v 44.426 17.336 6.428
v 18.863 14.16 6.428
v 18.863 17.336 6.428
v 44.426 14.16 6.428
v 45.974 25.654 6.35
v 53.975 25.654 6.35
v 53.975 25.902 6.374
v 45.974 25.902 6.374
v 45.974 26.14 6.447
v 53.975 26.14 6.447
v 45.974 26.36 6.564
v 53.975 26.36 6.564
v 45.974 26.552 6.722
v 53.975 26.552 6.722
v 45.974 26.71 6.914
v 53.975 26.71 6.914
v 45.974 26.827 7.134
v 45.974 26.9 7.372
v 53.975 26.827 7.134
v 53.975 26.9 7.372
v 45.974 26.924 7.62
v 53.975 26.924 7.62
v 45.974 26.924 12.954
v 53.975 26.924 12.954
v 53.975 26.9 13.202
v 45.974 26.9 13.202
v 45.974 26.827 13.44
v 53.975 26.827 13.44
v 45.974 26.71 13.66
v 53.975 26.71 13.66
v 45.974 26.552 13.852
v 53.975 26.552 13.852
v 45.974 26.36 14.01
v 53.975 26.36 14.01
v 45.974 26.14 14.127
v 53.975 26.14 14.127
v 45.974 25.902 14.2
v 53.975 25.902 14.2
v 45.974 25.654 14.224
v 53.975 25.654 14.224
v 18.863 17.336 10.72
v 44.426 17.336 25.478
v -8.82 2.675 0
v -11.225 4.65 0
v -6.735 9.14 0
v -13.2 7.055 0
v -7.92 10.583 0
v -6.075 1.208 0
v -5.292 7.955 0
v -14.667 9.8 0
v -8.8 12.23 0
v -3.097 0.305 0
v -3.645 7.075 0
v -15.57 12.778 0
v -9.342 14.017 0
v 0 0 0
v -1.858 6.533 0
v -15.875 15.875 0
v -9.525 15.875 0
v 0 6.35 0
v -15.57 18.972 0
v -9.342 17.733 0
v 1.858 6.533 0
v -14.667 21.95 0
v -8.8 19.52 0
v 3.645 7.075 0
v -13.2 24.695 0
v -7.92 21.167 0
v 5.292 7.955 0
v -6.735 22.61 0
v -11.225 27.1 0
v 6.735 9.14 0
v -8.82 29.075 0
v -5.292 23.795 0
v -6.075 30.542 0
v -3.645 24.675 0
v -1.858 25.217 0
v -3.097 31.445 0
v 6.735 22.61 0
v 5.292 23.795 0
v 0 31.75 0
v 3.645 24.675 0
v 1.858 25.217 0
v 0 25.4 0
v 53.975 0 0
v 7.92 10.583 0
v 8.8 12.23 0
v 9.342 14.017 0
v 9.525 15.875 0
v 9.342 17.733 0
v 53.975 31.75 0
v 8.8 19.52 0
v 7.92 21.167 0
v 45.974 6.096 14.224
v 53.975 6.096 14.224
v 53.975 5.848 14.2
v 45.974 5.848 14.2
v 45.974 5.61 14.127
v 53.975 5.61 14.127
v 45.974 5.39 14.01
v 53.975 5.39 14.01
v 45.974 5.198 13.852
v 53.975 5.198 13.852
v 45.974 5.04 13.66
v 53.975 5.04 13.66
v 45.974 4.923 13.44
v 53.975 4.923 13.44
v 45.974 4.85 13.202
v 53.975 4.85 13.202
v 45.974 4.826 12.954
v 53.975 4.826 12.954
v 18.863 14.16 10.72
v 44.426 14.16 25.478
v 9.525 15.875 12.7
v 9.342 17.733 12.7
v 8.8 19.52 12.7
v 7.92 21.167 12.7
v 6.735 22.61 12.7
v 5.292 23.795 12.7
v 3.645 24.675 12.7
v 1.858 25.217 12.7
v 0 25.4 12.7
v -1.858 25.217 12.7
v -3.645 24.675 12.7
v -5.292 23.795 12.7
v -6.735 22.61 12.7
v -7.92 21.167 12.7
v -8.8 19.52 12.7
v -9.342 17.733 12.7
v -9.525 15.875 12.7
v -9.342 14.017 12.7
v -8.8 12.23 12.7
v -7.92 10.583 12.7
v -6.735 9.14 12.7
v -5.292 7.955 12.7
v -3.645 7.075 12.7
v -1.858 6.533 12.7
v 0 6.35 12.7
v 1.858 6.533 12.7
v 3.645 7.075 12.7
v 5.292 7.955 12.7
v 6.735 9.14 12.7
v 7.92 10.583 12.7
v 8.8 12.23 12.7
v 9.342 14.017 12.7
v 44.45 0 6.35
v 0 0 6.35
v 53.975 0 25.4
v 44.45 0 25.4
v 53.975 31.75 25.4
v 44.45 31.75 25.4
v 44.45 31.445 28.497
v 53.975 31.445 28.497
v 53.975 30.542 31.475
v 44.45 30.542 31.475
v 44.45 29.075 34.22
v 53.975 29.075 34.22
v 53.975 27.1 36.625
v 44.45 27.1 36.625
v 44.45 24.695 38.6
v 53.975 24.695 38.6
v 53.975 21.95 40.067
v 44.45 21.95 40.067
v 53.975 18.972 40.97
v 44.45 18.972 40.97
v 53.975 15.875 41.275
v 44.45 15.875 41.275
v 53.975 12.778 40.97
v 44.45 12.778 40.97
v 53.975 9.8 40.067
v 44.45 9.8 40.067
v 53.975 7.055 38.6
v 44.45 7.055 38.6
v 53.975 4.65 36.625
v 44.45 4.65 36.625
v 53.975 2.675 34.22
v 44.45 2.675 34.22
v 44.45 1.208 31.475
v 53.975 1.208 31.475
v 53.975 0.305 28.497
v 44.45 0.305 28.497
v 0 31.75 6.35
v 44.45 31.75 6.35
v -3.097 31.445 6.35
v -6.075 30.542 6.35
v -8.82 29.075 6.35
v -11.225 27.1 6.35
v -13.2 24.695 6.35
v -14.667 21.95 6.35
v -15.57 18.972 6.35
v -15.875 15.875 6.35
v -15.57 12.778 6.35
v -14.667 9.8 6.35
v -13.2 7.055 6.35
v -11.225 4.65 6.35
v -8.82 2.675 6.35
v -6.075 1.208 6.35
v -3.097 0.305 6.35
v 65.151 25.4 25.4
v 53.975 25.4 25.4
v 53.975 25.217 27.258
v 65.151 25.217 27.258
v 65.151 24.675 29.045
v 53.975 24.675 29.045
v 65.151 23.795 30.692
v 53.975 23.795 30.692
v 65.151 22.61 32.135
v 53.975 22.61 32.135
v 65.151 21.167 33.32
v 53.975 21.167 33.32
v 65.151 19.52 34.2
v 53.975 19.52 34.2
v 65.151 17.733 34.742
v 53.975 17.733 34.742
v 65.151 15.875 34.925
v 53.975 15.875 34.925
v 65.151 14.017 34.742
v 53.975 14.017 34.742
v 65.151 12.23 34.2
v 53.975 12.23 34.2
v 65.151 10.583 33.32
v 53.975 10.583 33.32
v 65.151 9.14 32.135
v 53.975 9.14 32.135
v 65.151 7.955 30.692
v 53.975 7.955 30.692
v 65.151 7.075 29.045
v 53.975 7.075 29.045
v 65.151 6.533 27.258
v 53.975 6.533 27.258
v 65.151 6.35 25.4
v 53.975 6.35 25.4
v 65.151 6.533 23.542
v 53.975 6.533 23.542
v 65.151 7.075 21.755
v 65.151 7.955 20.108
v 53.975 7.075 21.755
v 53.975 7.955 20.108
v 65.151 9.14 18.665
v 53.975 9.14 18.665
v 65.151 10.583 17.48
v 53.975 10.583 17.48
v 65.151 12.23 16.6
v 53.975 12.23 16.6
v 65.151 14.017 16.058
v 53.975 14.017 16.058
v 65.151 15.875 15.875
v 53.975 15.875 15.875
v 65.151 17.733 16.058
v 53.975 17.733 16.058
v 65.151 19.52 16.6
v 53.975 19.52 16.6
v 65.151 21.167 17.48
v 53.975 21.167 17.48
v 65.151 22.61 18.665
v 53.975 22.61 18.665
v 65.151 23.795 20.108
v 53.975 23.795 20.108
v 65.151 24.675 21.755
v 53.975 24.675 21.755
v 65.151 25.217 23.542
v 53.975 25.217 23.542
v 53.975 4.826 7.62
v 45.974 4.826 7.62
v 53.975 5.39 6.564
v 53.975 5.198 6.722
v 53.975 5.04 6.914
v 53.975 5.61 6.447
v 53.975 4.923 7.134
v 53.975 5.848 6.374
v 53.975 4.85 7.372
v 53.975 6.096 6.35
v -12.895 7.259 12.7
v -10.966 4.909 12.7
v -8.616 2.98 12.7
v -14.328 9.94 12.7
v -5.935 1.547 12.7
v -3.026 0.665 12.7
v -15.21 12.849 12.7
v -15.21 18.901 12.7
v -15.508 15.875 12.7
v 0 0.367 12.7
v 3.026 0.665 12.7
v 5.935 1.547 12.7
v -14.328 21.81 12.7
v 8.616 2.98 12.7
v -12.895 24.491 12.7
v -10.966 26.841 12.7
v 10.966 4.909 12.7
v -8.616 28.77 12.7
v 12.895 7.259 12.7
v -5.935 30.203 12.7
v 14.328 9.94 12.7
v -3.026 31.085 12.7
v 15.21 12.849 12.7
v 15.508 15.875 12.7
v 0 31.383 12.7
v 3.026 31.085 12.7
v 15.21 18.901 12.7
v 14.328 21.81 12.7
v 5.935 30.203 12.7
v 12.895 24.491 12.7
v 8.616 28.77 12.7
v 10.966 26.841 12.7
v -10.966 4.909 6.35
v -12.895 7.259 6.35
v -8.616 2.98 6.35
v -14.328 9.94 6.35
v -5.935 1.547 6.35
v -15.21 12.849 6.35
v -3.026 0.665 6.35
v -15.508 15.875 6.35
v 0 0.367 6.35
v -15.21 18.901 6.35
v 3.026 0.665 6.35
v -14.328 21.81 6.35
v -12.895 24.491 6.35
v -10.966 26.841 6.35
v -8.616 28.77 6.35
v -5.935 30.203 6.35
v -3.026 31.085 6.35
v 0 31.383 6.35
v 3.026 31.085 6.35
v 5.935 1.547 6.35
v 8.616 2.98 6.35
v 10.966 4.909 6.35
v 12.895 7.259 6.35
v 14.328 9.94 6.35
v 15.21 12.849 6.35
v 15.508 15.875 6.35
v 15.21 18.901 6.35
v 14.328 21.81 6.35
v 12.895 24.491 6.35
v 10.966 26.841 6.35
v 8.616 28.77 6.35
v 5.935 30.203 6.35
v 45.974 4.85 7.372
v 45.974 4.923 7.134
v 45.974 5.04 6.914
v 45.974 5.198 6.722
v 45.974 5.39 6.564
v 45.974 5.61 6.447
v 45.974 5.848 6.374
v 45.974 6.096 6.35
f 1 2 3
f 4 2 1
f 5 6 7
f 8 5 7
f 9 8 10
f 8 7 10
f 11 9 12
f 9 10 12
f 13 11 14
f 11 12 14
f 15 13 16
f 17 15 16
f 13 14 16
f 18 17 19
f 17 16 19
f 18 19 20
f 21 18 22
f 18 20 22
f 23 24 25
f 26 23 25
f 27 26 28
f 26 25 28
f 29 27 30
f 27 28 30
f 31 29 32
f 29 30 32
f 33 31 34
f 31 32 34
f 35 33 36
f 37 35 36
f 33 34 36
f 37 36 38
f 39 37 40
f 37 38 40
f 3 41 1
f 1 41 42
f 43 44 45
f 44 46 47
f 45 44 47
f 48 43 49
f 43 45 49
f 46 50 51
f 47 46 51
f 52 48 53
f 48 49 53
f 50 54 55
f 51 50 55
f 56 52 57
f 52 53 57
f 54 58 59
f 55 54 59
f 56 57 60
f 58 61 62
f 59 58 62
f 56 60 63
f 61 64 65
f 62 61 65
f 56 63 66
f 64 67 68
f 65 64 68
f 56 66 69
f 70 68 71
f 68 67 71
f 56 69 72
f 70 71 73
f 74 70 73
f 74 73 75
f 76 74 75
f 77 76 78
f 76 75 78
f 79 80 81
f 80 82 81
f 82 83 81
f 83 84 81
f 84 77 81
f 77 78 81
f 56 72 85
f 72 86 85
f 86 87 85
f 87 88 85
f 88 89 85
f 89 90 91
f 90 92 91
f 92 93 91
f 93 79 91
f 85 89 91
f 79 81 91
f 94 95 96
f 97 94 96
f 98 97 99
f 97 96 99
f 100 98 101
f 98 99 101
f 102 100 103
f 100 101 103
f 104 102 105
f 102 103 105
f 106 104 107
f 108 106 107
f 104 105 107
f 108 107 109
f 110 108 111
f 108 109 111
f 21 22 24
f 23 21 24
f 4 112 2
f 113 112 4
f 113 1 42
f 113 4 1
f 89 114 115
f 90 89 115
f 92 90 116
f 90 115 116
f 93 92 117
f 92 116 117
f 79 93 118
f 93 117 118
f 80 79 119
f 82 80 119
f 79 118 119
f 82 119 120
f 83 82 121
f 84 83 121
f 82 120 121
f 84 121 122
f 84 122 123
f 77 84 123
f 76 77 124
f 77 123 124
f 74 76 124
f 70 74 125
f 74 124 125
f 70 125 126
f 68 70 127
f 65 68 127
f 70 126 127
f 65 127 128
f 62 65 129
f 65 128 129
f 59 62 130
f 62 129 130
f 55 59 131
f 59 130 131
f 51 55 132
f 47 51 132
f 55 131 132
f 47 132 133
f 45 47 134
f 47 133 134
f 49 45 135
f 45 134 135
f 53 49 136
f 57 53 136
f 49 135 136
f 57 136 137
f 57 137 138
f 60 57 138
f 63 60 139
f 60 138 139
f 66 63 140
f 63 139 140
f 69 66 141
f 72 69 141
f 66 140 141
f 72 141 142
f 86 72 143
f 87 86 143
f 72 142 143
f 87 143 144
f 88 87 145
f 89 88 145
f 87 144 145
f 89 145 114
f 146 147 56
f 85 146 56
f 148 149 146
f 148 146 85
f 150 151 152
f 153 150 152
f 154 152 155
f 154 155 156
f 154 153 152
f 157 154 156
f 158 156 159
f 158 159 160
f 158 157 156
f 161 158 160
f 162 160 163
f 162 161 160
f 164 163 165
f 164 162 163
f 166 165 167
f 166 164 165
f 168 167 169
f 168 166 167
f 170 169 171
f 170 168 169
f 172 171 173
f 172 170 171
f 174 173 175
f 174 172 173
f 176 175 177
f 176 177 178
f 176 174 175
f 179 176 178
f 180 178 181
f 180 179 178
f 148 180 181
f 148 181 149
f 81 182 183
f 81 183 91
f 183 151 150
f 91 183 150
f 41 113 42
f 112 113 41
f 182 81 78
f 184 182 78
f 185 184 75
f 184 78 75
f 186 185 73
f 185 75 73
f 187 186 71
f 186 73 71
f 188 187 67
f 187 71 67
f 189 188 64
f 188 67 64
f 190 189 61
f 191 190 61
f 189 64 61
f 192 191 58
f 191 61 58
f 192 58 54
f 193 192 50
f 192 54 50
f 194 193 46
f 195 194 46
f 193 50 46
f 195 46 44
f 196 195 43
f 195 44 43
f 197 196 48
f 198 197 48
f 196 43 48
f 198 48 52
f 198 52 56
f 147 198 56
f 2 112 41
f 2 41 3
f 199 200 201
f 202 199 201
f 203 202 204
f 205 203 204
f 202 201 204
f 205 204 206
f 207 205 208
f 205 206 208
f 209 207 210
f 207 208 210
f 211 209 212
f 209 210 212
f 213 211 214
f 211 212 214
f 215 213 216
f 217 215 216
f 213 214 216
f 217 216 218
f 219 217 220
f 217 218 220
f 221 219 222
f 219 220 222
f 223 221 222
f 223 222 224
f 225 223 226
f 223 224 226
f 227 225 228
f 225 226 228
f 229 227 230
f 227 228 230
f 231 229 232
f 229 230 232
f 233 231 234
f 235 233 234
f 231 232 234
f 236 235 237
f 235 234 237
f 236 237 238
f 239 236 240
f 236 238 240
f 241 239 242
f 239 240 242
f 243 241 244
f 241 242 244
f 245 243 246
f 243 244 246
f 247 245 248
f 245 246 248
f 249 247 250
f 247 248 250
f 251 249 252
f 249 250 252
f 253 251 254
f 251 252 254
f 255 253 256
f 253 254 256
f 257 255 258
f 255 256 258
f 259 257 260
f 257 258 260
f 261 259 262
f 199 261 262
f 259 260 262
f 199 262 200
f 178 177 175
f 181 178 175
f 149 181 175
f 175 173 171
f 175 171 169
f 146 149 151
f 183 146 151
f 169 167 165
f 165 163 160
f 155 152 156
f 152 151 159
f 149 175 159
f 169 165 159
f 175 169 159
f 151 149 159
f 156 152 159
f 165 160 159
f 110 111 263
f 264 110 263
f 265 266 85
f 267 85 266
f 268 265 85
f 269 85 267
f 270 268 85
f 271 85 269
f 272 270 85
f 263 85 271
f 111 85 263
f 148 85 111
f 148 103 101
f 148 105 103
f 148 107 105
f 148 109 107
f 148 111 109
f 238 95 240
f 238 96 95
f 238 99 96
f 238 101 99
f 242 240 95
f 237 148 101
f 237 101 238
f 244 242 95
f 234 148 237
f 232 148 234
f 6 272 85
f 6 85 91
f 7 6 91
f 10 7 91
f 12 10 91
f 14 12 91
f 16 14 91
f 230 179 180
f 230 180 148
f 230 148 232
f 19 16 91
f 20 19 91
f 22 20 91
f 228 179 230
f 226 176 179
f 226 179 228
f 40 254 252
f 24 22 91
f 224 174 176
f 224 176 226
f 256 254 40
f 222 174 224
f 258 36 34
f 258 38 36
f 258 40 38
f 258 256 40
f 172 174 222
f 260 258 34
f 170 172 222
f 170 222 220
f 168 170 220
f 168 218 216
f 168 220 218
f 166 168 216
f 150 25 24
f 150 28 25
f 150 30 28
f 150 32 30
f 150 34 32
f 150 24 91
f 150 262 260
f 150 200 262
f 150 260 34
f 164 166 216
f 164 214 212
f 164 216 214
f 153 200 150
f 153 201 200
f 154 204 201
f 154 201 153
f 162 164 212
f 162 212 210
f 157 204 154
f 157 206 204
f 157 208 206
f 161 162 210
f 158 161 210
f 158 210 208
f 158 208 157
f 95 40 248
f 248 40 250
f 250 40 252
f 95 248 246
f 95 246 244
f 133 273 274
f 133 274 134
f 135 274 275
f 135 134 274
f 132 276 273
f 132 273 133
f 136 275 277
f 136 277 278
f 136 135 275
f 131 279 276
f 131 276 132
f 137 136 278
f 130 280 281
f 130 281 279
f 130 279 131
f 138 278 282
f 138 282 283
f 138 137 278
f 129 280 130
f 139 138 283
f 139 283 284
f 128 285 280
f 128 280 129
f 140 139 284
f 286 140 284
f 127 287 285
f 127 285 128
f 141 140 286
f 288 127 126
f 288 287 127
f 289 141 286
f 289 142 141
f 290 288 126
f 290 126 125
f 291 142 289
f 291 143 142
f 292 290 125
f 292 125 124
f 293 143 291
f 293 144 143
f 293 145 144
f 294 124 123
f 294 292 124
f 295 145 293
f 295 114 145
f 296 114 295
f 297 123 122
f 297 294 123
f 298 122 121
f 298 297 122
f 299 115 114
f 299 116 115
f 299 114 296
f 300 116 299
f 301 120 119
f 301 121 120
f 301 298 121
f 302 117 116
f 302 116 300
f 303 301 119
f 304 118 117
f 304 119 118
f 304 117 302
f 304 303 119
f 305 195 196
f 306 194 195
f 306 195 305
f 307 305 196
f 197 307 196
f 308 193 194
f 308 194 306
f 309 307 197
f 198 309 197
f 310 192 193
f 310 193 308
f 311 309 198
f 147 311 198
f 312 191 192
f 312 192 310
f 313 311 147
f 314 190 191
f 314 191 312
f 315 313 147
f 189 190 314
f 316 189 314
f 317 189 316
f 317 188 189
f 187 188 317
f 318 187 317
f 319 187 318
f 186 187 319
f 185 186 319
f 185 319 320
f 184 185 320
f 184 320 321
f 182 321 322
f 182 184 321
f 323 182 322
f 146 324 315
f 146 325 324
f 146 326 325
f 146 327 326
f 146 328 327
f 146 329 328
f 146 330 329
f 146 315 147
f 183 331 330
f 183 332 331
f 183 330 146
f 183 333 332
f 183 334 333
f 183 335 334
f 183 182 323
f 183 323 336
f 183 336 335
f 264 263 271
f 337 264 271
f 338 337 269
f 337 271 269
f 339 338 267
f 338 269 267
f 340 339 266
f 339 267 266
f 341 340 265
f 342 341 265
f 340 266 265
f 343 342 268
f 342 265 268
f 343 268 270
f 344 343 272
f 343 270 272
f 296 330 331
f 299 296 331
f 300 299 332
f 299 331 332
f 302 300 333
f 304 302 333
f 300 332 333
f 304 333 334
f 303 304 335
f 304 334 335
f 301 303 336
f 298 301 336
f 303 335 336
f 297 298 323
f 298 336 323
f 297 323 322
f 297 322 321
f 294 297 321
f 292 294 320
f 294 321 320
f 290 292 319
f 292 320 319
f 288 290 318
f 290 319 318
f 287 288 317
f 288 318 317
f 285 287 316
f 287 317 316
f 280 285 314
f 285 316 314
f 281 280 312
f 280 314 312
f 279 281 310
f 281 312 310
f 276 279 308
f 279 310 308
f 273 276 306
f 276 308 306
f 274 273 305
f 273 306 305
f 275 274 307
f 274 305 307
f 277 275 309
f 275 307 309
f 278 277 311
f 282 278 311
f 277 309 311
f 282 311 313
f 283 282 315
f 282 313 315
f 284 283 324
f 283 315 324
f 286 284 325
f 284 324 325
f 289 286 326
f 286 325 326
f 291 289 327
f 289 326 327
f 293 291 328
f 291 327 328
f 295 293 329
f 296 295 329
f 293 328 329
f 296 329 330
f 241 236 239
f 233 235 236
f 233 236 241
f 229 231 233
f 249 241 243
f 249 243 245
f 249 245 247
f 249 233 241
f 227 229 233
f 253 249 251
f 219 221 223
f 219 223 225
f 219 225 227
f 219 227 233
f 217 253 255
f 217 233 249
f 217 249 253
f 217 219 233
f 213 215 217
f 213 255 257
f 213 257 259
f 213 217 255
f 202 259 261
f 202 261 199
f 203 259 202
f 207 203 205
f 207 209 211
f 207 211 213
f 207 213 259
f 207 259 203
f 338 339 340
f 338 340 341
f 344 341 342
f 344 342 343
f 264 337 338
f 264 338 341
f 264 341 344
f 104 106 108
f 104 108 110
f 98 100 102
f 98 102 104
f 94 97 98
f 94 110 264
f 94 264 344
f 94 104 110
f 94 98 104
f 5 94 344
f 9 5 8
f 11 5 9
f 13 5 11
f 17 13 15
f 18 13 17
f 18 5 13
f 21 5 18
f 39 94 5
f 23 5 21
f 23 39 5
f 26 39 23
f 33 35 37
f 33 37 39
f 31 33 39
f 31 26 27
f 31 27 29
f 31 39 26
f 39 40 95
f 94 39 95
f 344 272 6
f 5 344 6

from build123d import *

# Parameters (mm, degrees)
F0_W      = 53.975
F0_H      = 31.75
F1_DEPTH  = 6.35
F2_R      = 15.5082112309
F3_DEPTH  = 6.35
F4_R      = 9.525
F5_DEPTH  = 12.7
F6_W      = 9.525
F6_H      = 19.05
F7_DEPTH  = 31.75
F9_DEPTH  = 9.525
F10_R     = 9.525
F11_DEPTH = 11.176
F13_DEPTH = 8.001
F16_DEPTH = 1.5875


# Not quite as in the source:
# - the program builds the solid bodies; features that only make, move or delete a surface that nothing else refers to are left out


with BuildPart() as f1:
    # F0 (on Top) → F1 (new body)
    with BuildSketch(Plane.XY):
        with BuildLine():
            ThreePointArc((0, 31.75), (-15.875, 15.875), (0, 0))
            Line((0, 0), (0, 31.75))
        make_face()
        with Locations((26.9875, 15.875)):
            Rectangle(F0_W, F0_H)
    extrude(amount=F1_DEPTH)

    # F2 (on face) → F3 (join)
    with BuildSketch(Plane.XY.offset(6.35)):
        with Locations((0, 15.875)):
            Circle(F2_R)
    extrude(amount=F3_DEPTH)

    # F4 (on face) → F5 (cut)
    with BuildSketch(Plane.XY.offset(12.7)):
        with Locations((0, 15.875)):
            Circle(F4_R)
    extrude(amount=-F5_DEPTH, mode=Mode.SUBTRACT)

    # F6 (on face) → F7 (join)
    with BuildSketch(Plane.XZ):
        with Locations((49.2125, 15.875)):
            Rectangle(F6_W, F6_H)
    extrude(amount=-F7_DEPTH)

    # F8 (on face) → F9 (join)
    with BuildSketch(Plane.YZ.offset(53.975)):
        with BuildLine():
            Line((0, 25.4), (31.75, 25.4))
            ThreePointArc((31.75, 25.4), (15.875, 41.275), (0, 25.4))
        make_face()
    extrude(amount=-F9_DEPTH)

    # F10 (on face) → F11 (join)
    with BuildSketch(Plane.YZ.offset(53.975)):
        with Locations((15.875, 25.4)):
            Circle(F10_R)
    extrude(amount=F11_DEPTH)

    # F12 (on face) → F13 (cut)
    with BuildSketch(Plane.YZ.offset(53.975)):
        with BuildLine():
            Line((25.654, 14.224), (6.096, 14.224))
            ThreePointArc((6.096, 14.224), (5.1979743879, 13.8520256121), (4.826, 12.954))
            Line((4.826, 12.954), (4.826, 7.62))
            ThreePointArc((4.826, 7.62), (5.1979743879, 6.7219743879), (6.096, 6.35))
            Line((6.096, 6.35), (25.654, 6.35))
            ThreePointArc((25.654, 6.35), (26.5520256121, 6.7219743879), (26.924, 7.62))
            Line((26.924, 7.62), (26.924, 12.954))
            ThreePointArc((26.924, 12.954), (26.5520256121, 13.8520256121), (25.654, 14.224))
        make_face()
    extrude(amount=-F13_DEPTH, mode=Mode.SUBTRACT)


with BuildPart() as f16:
    # F15 (on offset) → F16 (new body, symmetric)
    with BuildSketch(Plane.XZ.offset(-15.748)):
        Polygon((44.4256004055, 6.4279241487), (44.4256004055, 25.4779241487), (18.863295002, 10.719520243), (18.863295002, 6.4279241487), align=None)
    extrude(amount=F16_DEPTH, both=True)


solid = Compound([f1.part, f16.part])
